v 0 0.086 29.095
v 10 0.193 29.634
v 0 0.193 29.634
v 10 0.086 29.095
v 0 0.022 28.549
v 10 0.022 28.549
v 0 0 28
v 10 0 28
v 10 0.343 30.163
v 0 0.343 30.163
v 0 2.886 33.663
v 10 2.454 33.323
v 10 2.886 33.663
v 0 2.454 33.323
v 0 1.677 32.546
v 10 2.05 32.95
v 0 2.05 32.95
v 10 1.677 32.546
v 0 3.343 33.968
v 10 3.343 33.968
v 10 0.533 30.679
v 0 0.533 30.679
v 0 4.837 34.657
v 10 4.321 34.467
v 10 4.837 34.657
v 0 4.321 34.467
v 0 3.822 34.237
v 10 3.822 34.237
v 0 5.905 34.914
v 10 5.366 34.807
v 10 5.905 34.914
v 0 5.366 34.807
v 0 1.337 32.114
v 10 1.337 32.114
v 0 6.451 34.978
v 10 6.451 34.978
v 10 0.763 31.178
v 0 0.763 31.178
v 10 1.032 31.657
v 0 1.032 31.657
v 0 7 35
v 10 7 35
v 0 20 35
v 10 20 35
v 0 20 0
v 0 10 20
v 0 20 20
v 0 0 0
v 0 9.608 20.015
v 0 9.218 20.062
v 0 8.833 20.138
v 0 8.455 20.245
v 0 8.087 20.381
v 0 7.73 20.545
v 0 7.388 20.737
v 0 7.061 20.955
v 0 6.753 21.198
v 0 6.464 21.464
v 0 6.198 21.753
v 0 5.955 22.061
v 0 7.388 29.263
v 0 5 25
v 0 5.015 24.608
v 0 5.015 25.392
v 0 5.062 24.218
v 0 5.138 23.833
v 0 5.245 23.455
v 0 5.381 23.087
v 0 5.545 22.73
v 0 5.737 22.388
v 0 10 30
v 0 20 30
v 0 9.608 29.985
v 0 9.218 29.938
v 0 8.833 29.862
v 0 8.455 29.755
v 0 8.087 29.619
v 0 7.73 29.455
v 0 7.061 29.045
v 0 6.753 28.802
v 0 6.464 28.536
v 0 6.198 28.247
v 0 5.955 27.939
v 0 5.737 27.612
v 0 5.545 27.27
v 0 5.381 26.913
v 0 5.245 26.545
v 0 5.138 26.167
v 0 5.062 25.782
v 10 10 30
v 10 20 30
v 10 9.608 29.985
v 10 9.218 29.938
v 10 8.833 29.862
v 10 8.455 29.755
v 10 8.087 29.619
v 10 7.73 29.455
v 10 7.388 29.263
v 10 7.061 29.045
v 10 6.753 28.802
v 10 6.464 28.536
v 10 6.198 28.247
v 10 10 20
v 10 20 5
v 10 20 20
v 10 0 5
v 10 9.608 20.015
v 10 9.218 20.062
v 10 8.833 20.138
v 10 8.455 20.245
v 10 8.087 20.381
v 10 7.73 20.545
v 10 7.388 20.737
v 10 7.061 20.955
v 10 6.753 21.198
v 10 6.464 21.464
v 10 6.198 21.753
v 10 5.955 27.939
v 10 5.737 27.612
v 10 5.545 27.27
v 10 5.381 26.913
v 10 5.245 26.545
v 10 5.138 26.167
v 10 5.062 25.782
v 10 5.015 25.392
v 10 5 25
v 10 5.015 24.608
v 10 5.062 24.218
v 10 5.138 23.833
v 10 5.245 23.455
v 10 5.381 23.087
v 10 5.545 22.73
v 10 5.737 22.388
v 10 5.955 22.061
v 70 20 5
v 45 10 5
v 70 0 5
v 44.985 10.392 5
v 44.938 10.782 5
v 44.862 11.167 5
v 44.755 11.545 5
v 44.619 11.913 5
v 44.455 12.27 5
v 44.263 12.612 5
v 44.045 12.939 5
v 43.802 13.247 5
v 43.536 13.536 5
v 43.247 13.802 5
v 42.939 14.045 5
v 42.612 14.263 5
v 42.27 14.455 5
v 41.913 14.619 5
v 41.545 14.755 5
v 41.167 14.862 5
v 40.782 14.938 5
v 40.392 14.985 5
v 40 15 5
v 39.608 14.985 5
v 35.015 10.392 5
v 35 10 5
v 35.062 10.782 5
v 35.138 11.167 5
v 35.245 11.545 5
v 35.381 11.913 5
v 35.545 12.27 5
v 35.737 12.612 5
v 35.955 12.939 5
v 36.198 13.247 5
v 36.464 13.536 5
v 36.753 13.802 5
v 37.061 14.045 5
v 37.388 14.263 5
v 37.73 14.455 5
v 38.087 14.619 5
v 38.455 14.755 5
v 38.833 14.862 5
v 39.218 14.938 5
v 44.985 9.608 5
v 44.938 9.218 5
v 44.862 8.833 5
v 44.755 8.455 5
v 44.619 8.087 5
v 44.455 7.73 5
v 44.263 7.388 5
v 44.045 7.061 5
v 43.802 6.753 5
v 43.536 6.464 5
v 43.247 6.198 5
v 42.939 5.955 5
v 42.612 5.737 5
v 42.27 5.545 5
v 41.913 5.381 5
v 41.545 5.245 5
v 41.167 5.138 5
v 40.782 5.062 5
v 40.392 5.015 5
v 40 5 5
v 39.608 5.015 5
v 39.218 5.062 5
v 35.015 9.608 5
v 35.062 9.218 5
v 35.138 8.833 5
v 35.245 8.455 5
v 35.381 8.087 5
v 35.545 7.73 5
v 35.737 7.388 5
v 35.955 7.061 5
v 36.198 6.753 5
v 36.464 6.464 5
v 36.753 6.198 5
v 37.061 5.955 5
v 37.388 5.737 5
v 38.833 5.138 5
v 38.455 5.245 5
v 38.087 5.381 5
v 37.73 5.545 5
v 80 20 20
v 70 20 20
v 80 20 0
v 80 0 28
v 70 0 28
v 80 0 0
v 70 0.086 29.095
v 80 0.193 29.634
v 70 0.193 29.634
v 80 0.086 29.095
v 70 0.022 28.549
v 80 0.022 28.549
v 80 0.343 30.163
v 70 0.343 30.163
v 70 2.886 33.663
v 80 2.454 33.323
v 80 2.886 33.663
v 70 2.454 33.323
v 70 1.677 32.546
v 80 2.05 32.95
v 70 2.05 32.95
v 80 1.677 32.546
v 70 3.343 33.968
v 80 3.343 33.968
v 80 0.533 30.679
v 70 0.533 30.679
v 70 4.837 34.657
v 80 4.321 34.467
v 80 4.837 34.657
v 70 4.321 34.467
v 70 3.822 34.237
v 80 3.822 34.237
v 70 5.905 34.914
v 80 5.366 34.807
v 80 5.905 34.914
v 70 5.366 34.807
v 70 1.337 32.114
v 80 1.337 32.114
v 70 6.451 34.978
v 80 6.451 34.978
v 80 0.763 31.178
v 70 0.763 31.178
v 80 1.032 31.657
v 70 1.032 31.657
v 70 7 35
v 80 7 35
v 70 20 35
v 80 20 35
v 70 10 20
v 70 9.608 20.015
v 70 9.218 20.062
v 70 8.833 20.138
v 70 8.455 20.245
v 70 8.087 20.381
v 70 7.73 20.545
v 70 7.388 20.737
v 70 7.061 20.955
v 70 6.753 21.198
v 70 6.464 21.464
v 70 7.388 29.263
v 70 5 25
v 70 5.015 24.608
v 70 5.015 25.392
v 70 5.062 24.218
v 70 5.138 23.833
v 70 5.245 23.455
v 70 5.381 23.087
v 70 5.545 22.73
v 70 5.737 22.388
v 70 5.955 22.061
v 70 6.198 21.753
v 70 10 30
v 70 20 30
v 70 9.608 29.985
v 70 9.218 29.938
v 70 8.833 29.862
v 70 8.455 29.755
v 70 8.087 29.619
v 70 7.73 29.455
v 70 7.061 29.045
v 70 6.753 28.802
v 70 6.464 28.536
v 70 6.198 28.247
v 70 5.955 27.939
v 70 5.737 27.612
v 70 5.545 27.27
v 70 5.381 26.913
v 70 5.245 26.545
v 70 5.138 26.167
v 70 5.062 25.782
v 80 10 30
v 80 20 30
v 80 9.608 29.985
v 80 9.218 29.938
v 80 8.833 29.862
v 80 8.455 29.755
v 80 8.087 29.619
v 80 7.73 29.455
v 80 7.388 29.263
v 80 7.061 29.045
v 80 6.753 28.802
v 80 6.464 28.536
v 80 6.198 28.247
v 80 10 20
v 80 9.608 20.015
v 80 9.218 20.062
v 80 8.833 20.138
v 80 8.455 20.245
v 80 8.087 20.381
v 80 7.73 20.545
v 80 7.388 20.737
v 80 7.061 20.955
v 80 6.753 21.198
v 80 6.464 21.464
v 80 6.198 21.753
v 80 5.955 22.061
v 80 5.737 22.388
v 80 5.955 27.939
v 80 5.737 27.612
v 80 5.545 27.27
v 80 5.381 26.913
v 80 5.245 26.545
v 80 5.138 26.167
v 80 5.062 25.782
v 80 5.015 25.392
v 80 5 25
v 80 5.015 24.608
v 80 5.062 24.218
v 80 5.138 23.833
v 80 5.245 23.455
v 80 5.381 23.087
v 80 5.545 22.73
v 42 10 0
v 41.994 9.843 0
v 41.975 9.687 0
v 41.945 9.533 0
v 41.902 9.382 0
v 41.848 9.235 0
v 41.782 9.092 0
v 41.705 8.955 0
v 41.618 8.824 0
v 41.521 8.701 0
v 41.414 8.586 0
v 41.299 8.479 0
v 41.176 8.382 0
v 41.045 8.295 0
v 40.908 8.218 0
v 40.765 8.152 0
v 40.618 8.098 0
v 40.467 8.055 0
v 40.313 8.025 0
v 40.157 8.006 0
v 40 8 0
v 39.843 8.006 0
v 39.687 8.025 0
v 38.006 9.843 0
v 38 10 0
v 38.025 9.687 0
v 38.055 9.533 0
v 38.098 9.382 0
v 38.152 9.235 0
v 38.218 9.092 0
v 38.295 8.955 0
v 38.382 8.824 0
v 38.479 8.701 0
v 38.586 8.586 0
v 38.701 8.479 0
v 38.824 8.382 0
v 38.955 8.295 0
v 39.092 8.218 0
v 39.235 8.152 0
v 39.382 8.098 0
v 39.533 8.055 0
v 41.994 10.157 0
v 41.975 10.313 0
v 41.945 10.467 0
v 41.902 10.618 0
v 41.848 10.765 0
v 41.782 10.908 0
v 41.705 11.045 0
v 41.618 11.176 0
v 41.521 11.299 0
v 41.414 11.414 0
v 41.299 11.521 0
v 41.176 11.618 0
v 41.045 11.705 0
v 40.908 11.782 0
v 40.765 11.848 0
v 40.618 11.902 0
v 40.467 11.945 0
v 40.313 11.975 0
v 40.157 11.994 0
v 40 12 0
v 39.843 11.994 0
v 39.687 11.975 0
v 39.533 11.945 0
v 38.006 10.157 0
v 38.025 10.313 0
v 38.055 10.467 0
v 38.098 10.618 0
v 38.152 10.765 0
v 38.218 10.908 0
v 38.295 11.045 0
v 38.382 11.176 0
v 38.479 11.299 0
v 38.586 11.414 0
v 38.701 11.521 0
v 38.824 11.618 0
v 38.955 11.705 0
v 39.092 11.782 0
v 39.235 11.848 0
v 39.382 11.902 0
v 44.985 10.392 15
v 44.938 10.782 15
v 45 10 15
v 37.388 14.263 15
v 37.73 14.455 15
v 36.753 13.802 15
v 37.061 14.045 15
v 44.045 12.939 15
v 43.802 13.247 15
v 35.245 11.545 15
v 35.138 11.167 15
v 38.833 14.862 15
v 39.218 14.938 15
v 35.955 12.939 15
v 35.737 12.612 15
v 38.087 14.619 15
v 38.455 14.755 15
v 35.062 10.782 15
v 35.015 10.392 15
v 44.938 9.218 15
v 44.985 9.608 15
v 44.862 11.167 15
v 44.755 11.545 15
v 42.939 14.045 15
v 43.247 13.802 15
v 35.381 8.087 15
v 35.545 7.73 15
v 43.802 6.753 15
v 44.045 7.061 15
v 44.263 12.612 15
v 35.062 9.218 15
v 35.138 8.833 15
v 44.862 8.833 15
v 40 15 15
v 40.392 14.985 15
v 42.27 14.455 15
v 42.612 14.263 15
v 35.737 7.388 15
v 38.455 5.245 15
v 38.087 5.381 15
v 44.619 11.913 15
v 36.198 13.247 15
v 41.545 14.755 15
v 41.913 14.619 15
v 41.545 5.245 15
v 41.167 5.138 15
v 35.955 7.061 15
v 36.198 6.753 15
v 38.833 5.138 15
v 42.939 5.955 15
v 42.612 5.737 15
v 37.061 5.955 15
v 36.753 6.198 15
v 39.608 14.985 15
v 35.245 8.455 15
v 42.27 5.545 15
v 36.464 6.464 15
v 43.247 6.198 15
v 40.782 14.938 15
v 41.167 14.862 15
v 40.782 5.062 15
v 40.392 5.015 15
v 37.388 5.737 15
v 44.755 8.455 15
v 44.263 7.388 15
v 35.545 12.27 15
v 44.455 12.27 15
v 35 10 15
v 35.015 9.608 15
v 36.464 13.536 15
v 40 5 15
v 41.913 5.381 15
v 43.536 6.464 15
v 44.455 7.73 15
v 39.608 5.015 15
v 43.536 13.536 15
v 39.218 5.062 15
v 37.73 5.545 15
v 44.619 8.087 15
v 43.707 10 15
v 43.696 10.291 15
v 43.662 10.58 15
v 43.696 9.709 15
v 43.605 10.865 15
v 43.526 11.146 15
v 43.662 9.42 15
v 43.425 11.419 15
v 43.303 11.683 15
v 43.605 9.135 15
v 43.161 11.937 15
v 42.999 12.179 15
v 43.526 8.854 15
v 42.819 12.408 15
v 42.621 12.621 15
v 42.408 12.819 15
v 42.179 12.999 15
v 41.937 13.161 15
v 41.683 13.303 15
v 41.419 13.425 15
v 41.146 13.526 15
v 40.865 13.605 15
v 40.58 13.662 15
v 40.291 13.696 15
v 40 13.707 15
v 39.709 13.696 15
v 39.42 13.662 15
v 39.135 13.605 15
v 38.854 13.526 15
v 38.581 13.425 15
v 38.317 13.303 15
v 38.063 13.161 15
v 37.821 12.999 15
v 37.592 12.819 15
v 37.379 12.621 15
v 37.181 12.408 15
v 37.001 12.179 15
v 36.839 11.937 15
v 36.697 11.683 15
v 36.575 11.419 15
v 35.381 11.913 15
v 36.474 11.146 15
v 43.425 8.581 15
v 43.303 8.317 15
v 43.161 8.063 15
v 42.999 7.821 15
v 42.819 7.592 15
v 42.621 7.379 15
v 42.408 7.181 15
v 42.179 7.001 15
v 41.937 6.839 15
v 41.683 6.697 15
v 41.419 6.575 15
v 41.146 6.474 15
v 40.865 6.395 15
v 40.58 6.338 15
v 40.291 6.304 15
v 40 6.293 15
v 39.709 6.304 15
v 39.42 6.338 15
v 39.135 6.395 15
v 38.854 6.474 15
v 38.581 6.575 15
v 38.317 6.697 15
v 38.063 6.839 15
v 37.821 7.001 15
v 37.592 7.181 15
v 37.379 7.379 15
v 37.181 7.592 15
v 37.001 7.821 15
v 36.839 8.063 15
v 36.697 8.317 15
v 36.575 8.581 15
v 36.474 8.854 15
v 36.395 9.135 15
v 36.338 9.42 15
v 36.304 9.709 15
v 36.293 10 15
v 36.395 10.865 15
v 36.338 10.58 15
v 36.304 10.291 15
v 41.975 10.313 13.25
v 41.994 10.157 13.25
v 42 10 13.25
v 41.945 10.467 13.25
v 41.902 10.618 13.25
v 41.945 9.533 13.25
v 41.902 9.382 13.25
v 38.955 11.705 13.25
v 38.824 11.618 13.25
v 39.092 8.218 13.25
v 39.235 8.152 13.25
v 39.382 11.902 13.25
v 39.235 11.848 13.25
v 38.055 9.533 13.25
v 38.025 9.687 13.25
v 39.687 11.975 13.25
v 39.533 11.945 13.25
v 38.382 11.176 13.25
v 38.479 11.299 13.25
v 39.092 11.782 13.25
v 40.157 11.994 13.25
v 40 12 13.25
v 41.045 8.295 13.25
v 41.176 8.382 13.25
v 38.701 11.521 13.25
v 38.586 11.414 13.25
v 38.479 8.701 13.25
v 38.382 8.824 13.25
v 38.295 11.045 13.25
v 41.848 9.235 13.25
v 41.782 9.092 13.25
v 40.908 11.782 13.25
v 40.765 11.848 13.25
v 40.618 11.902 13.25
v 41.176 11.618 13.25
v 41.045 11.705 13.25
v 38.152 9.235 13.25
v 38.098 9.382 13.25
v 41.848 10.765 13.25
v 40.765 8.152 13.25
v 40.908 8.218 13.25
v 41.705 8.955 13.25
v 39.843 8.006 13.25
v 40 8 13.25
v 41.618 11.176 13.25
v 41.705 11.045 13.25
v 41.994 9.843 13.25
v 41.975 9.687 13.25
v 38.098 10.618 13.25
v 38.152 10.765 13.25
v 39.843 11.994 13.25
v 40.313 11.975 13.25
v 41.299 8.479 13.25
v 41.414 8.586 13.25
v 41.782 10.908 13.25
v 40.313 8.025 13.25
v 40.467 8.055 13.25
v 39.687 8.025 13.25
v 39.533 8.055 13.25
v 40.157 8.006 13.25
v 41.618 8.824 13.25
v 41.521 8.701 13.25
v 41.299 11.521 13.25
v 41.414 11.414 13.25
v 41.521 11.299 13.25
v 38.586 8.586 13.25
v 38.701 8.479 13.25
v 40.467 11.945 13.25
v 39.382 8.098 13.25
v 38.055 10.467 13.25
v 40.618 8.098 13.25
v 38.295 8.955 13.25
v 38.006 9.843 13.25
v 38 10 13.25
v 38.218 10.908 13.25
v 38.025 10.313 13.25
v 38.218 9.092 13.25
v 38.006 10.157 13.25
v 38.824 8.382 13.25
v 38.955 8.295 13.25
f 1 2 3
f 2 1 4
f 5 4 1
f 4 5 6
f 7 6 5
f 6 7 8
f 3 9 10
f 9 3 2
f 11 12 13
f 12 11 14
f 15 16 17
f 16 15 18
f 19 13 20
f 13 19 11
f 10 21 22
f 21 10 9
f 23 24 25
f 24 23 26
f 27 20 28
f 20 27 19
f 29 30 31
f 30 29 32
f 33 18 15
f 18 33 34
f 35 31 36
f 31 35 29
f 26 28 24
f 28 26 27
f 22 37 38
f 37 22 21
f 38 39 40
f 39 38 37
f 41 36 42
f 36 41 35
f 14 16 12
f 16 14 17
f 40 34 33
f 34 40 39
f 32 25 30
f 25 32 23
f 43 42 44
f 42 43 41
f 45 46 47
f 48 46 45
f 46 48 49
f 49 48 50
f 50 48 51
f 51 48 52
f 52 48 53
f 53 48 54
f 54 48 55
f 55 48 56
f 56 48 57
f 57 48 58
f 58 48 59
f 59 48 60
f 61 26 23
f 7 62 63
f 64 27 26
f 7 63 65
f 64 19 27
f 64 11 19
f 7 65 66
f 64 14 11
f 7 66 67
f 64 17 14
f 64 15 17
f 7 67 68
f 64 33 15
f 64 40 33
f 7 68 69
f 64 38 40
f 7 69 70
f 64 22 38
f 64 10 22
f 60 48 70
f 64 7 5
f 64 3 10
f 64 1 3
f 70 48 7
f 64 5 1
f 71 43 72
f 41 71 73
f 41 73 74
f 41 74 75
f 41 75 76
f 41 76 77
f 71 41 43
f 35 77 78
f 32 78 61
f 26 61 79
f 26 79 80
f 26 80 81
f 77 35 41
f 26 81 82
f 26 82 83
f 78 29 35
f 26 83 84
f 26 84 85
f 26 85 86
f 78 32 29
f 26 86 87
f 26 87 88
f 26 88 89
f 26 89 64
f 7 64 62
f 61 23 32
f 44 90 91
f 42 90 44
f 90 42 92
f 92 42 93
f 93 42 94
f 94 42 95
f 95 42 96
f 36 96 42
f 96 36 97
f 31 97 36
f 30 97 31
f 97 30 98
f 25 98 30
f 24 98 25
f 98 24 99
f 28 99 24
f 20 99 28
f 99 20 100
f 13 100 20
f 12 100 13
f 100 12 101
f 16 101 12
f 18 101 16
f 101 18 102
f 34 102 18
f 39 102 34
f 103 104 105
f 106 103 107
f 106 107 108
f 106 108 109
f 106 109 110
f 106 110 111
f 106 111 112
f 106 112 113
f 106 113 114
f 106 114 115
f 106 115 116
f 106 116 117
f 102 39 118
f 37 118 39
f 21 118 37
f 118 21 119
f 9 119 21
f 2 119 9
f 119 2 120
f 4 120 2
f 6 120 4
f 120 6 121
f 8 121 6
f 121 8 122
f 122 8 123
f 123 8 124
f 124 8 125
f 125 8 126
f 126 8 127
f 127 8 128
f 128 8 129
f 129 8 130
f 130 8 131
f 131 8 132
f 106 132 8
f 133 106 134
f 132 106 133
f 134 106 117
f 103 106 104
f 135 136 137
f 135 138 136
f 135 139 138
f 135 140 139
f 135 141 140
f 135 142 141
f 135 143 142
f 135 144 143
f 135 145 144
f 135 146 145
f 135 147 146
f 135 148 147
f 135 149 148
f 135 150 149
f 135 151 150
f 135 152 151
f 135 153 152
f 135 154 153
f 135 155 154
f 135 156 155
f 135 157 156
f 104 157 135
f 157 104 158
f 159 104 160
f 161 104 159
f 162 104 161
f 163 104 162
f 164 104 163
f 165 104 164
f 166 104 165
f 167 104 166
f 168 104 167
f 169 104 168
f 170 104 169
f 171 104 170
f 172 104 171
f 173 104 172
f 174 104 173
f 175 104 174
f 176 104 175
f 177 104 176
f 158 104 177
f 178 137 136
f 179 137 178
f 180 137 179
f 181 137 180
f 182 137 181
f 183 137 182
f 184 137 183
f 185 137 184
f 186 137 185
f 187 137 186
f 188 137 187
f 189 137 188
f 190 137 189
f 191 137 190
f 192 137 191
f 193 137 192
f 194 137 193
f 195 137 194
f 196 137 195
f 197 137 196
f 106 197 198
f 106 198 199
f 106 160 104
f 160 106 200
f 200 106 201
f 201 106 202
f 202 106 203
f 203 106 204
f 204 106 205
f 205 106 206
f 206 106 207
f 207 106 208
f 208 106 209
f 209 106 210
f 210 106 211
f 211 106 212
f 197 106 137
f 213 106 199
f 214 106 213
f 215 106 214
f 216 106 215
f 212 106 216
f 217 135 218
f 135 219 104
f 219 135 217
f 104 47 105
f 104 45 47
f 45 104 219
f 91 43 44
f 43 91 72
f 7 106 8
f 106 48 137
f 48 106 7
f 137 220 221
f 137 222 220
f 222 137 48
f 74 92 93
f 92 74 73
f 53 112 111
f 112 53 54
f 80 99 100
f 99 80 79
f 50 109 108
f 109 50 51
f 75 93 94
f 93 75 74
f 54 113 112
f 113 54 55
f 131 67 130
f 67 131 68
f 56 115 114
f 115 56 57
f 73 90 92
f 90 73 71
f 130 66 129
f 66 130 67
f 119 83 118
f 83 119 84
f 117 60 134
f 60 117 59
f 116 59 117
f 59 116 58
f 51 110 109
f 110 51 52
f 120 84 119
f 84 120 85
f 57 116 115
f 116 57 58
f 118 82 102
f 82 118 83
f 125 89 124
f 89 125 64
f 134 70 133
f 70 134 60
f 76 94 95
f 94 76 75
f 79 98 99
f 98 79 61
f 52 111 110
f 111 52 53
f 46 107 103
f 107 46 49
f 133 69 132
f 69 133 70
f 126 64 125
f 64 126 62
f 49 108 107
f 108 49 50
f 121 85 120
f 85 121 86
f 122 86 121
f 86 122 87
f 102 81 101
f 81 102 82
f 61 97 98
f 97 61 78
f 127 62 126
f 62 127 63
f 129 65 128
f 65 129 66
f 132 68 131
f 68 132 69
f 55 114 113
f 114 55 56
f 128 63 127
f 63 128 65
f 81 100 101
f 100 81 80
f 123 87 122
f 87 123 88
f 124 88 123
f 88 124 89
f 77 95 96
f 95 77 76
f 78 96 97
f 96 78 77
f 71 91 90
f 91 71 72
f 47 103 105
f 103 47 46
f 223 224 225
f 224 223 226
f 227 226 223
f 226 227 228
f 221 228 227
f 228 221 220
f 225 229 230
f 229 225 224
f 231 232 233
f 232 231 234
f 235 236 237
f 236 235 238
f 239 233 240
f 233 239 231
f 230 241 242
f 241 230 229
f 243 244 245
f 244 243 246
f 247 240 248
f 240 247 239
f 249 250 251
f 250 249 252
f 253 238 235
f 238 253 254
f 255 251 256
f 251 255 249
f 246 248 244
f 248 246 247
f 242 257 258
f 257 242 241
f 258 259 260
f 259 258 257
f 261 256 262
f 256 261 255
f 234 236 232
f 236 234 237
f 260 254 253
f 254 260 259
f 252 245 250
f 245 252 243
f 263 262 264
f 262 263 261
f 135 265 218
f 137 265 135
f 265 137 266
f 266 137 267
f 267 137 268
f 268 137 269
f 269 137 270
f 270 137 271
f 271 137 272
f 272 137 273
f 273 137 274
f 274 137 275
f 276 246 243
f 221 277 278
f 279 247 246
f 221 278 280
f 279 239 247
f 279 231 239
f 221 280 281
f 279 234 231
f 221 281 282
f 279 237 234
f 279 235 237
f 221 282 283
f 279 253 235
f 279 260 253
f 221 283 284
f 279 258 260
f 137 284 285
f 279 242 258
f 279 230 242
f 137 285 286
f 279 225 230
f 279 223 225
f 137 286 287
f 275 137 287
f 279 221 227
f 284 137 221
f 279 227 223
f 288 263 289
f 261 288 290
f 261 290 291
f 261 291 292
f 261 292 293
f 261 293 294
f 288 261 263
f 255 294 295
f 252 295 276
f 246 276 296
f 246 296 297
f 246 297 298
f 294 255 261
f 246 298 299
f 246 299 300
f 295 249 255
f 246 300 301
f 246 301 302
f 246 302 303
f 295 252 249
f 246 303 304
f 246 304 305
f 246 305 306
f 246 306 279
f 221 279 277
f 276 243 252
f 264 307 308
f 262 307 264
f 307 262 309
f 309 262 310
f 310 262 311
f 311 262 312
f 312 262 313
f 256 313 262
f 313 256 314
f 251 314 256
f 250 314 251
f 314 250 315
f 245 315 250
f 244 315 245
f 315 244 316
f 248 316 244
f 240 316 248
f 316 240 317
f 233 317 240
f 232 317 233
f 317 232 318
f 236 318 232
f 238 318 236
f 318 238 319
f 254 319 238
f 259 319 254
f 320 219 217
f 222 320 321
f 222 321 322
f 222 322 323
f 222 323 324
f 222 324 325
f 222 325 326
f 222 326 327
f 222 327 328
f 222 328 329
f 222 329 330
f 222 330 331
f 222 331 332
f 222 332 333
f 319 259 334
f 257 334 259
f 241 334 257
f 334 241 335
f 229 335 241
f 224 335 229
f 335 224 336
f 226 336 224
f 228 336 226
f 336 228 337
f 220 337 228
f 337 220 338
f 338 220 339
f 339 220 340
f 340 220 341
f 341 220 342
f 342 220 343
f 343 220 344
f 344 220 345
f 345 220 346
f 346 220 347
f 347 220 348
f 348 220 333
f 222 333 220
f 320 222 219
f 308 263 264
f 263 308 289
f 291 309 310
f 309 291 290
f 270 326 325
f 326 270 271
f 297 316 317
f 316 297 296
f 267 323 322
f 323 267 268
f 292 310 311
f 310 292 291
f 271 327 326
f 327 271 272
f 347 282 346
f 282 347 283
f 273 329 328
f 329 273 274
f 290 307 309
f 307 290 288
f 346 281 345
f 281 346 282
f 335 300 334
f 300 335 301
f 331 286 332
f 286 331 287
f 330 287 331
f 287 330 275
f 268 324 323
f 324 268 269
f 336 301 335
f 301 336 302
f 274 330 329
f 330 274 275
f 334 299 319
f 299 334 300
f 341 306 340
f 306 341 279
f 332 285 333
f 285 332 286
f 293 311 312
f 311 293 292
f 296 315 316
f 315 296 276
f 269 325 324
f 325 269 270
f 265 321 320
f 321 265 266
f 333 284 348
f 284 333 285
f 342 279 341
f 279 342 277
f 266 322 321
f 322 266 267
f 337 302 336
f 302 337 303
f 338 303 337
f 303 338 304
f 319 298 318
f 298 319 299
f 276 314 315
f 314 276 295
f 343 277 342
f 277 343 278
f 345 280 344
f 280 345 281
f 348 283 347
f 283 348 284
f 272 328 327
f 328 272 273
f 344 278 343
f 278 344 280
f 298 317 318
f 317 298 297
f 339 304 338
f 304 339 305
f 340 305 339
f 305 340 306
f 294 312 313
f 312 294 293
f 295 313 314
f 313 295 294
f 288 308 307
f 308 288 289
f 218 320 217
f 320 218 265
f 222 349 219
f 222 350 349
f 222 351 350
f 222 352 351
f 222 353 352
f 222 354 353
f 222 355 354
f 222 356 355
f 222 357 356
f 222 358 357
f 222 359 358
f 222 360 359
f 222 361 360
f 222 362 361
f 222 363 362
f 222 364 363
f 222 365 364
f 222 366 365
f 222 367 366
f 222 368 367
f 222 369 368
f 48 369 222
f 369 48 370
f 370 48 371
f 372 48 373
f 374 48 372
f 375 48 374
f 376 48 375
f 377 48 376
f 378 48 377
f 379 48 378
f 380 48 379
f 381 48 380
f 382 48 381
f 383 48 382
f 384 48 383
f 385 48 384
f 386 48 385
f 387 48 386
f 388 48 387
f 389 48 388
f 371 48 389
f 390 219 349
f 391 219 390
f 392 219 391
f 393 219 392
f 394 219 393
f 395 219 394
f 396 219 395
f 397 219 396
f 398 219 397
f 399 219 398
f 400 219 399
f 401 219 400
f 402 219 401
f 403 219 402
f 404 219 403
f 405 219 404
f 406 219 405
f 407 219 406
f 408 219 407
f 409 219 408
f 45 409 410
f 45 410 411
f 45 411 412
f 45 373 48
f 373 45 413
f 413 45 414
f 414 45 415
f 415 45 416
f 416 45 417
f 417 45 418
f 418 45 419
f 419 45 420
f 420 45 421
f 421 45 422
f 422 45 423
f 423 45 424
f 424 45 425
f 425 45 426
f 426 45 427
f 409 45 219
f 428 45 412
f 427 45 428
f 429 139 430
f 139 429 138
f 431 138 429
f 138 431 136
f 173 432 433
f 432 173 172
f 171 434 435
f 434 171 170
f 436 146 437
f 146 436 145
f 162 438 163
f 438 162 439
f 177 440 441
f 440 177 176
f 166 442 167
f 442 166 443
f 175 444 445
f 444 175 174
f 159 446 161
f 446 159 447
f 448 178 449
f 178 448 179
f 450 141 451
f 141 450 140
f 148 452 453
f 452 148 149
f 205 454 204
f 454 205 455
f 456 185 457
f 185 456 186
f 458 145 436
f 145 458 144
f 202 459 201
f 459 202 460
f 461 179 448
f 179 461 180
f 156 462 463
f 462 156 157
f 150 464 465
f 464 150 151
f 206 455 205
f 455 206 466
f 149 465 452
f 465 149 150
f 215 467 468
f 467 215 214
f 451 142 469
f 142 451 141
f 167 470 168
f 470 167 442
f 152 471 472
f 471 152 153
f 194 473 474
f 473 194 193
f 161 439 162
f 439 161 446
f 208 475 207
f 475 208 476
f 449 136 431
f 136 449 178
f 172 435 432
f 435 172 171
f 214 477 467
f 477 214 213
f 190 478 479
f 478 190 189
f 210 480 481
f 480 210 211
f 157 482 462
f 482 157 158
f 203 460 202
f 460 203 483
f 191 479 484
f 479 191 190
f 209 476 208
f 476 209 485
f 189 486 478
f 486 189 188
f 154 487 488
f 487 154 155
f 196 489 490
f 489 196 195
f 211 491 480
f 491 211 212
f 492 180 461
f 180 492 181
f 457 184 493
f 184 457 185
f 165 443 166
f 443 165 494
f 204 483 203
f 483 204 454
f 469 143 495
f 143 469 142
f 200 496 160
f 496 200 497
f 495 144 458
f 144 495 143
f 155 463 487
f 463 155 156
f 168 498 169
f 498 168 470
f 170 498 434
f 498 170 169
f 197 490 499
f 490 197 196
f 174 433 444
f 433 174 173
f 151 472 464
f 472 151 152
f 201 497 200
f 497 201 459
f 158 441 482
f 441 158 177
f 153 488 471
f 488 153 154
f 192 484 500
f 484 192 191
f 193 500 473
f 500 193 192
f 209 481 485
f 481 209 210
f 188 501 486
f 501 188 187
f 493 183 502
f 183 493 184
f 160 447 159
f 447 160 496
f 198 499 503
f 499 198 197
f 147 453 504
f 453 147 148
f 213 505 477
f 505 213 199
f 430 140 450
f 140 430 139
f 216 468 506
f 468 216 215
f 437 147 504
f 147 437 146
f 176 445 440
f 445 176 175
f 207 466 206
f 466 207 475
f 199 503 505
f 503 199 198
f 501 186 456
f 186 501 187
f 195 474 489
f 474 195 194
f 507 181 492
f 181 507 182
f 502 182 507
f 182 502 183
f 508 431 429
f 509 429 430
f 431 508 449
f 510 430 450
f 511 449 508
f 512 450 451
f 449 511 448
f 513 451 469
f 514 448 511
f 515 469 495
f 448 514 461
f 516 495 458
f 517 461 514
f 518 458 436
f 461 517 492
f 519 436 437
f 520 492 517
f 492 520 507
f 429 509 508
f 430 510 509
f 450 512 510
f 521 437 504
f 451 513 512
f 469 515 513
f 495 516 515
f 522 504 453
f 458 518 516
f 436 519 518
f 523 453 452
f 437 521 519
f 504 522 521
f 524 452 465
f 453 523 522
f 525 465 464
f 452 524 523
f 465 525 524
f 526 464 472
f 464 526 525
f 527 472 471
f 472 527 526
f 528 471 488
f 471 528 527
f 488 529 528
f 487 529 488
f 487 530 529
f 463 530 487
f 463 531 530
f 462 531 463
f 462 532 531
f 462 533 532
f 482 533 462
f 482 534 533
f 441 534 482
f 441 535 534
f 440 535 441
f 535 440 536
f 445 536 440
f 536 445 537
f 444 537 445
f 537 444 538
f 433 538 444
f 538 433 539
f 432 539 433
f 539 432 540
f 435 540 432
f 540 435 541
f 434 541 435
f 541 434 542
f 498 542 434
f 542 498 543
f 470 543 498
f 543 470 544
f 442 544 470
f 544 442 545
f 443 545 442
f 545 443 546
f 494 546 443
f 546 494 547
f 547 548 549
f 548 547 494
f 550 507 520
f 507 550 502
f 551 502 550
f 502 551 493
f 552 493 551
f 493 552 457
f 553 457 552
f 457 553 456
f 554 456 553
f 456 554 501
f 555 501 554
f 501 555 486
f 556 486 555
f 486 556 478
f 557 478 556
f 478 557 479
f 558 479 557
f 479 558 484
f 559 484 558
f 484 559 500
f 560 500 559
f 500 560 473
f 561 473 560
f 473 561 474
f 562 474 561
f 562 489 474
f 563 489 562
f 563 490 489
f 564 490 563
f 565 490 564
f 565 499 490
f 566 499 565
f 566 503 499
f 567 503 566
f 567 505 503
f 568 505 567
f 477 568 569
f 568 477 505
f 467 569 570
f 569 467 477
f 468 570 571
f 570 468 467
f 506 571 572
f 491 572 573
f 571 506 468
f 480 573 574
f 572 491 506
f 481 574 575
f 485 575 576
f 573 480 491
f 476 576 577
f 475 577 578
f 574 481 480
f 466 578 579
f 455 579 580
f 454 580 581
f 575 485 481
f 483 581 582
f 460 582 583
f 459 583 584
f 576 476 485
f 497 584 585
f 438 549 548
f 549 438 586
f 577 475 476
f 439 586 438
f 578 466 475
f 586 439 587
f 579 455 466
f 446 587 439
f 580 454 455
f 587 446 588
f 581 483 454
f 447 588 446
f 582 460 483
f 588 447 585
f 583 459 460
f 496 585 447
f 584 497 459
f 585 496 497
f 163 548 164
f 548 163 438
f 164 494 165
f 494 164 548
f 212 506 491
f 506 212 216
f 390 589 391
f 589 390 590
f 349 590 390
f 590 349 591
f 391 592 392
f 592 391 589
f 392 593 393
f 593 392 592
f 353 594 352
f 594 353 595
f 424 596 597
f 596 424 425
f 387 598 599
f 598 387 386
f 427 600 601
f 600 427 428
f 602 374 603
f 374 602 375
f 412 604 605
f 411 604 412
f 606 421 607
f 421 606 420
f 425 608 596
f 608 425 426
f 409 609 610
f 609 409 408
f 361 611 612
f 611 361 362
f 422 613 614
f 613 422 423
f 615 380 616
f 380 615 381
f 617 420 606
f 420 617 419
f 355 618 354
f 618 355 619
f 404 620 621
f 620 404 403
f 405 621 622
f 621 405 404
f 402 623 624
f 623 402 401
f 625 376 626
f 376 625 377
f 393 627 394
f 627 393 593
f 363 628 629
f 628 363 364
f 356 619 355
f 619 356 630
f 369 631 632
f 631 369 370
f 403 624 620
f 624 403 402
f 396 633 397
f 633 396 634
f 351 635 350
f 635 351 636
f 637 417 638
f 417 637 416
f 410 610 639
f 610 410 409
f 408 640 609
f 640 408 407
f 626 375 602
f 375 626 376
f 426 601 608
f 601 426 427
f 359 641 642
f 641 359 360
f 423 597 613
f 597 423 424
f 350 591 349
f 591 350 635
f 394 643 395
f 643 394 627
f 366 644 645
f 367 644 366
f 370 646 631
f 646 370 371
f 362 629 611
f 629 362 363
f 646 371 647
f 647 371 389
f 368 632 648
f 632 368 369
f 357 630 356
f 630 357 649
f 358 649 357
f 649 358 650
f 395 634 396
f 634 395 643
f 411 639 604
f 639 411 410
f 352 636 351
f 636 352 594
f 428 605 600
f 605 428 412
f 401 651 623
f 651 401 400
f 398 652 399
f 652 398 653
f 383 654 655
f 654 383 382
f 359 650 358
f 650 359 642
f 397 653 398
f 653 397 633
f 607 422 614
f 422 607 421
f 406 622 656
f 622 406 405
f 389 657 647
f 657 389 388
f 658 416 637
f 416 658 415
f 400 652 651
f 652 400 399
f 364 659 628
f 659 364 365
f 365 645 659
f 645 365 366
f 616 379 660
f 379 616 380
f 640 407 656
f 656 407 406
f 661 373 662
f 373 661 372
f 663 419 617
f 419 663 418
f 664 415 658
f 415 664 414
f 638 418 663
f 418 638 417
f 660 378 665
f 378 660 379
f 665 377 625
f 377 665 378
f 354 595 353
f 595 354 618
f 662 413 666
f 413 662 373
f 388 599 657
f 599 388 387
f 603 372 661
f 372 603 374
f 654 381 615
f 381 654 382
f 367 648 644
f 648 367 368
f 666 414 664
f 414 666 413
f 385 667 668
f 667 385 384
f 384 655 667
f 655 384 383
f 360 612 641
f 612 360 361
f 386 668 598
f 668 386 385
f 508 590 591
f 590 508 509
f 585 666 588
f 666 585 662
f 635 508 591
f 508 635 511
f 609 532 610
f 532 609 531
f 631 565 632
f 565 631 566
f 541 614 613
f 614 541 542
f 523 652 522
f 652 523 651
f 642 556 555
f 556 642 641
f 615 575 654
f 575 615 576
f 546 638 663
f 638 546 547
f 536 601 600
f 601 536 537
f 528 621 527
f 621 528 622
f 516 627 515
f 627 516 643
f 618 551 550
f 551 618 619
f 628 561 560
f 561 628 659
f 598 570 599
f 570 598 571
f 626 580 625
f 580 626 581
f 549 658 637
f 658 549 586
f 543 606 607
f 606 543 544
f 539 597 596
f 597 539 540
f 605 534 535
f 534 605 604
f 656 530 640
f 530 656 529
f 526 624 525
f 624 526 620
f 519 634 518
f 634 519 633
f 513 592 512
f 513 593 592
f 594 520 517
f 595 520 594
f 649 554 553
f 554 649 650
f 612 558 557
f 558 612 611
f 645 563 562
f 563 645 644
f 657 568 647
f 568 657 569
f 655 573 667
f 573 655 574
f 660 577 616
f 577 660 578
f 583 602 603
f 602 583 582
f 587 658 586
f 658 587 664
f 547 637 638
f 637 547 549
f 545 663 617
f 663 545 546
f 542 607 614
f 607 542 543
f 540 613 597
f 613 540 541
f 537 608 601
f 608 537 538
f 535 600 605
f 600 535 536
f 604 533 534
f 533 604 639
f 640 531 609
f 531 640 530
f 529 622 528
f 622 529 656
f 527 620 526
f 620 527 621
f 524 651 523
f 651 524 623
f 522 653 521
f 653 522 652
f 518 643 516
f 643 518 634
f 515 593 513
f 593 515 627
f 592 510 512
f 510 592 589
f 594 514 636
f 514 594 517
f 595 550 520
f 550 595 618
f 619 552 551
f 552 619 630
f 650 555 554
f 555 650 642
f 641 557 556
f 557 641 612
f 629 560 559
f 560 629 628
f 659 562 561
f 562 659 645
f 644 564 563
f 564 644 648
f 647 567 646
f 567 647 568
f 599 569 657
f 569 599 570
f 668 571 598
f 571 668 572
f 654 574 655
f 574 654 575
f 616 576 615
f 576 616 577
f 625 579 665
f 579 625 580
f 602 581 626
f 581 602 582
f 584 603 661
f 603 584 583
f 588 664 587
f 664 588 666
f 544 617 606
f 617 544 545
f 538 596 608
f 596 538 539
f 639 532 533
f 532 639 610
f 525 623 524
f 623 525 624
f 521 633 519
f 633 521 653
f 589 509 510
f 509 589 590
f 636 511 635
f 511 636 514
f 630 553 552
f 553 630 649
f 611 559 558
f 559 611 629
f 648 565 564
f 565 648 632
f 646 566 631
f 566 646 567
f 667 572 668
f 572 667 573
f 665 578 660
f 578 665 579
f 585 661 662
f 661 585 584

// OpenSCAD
/*
	name: 		tube-wall-mount.scad
	author:		Aymeric B.
	date:		23.06.2014
*/


/****** PARAMETERS ****/
$fn = 80;
pad = 0.1;

/****** MODULES ****/
module RoundingEdge(radius, length) {	
	difference() {
		translate([0, 0, -pad]) {
			cube([2*radius+pad, 2*radius+pad, length+2*pad]);
		}
		translate([0, 0, -2*pad]) {
			cylinder(r=radius,h=length+4*pad);
		}
	}
}

module ScrewHole(hole_diameter, countersink_diameter, length) {	
	countersink_radius = countersink_diameter / 2;

	union() {
		translate([0, 0, -pad]) {
			cylinder(r=hole_diameter/2, h=length+2*pad);
		}
		translate([0, 0, length+2*pad-countersink_radius]) {
			cylinder(r1=0, r2=countersink_radius, h=countersink_radius+pad);
		}
	}
}

module Hook(diameter, depth, gap, length, thickness) {
	width = gap + diameter + thickness;
	height = depth + thickness;
	cylinder_center_position_x = gap + diameter/2;
	cylinder_center_position_y = height - depth + diameter/2;
	hook_radius = 7;

	difference() {
		cube([width, height, length]);
		translate([cylinder_center_position_x, cylinder_center_position_y, -1]) {
			cylinder(r=diameter/2, h=length+2);
		}
		translate([gap, cylinder_center_position_y, -1]){ 
			cube([diameter, depth, length+2]);
		}
		translate([width-hook_radius, hook_radius, 0]) {
			rotate([0, 0, -90]) {
				RoundingEdge(hook_radius, length);
			}	
		}		
	}	
}

module TubeWallMount(width, height, thickness, diameter, gap, wide) {
	difference() {
		union() {
			cube([width, height, thickness]);
			translate([wide, 0, thickness]) {
				rotate([0, -90, 0]) {
					Hook(diameter, height-thickness, gap, wide, thickness);
				}
			}
			translate([width, 0, thickness]) {
				rotate([0, -90, 0]) {
					Hook(diameter, height-thickness, gap, wide, thickness);
				}
			}
			translate([width/2, height/2, thickness]) {
				cylinder(r=5, h=10);
			}
		}
		translate([width/2, height/2, ]) {
			ScrewHole(4, 8, 15);
		}
	}
}

/****** RENDERS ****/
plate_width = 80;
plate_height = 20;
plate_thickness = 5;
tube_diameter = 10;
tube_wall_gap = 15;
hooks_width = 10;
TubeWallMount(plate_width, plate_height, plate_thickness, tube_diameter, tube_wall_gap, hooks_width);
